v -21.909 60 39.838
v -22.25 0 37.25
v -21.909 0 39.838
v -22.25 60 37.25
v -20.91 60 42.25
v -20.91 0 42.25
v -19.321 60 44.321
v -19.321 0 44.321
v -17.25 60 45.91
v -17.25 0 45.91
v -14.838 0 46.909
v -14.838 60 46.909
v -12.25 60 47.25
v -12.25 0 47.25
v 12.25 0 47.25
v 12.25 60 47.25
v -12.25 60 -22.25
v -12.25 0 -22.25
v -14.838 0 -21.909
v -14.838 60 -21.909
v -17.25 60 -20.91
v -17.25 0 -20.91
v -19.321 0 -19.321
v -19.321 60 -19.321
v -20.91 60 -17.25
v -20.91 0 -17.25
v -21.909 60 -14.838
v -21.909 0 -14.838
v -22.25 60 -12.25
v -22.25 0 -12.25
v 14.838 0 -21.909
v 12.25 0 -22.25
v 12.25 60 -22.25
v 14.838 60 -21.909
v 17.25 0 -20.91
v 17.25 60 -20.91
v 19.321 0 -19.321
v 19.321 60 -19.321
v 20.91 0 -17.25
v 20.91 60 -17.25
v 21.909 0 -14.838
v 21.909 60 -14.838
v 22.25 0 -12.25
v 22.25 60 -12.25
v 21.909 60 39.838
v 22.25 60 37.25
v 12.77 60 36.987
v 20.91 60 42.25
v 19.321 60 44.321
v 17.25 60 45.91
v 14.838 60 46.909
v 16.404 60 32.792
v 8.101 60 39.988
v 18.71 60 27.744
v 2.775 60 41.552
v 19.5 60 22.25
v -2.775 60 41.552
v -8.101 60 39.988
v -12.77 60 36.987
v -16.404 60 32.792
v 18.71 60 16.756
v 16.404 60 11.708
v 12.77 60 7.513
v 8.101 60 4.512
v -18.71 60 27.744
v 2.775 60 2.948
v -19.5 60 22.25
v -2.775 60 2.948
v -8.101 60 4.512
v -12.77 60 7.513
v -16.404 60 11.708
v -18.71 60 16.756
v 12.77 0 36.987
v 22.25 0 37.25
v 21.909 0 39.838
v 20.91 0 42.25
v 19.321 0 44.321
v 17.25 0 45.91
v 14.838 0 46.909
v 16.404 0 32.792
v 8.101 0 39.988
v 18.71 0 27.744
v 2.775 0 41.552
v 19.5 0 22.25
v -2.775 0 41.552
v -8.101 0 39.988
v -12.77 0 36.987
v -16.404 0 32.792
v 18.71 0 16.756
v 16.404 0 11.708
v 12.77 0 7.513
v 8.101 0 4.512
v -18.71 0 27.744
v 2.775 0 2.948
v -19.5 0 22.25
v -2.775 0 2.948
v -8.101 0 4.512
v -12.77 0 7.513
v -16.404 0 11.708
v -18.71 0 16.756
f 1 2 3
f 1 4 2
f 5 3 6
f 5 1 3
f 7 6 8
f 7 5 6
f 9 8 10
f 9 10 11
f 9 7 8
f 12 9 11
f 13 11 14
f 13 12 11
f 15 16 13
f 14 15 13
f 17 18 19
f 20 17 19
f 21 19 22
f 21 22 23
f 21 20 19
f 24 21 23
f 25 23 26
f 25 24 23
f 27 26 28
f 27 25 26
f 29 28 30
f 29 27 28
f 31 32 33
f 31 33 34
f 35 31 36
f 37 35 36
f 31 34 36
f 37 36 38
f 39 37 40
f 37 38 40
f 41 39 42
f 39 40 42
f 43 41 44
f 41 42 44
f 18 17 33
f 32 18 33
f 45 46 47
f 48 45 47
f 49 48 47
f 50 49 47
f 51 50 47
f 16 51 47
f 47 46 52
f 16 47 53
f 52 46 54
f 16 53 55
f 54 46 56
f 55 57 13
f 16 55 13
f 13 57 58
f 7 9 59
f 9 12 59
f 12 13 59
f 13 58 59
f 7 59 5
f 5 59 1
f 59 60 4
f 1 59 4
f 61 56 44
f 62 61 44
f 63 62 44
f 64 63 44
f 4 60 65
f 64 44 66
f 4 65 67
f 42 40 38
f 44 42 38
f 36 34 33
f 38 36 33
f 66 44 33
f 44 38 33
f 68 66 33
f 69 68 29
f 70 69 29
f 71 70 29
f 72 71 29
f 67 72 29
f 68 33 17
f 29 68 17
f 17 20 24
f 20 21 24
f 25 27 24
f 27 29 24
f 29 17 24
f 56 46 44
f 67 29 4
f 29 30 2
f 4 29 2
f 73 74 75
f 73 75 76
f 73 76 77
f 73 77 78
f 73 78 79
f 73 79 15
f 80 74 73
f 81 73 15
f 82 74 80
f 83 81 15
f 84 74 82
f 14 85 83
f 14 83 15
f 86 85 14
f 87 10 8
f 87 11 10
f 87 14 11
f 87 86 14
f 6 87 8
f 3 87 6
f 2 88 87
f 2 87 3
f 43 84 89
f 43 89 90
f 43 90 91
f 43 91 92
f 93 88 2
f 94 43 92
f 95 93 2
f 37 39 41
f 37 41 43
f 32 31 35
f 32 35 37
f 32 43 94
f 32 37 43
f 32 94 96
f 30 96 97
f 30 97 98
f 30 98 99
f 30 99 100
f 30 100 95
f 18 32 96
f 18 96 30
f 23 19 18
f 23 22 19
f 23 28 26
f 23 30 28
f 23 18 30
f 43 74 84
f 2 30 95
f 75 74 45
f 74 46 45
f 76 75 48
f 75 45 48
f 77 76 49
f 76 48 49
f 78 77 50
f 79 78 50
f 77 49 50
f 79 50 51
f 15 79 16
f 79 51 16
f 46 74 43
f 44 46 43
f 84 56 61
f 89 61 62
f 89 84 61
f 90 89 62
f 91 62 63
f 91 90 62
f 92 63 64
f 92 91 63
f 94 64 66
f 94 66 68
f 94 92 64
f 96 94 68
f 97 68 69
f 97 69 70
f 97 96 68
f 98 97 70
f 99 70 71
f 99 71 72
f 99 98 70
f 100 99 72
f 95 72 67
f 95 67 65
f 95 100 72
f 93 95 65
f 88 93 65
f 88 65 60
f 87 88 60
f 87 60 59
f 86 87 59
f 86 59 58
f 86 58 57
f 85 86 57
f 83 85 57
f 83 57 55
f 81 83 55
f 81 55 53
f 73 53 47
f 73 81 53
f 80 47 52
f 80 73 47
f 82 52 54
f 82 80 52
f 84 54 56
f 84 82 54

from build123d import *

# Parameters (mm, degrees)
SKETCH_1_R      = 19.5
EXTRUDE_1_DEPTH = 60
FILLET_1_R      = 10


with BuildPart() as part:
    # 草图1 → 凸台-拉伸1 (new body)
    with BuildSketch(Plane(origin=(0, 0, 0), x_dir=(1, 0, 0), z_dir=(0, 1, 0))):
        Polygon((-22.25, 22.25), (22.25, 22.25), (22.25, -22.25), (22.25, -47.25), (-22.25, -47.25), (-22.25, -22.25), align=None)
        with Locations((0, -22.25)):
            Circle(SKETCH_1_R, mode=Mode.SUBTRACT)
    extrude(amount=EXTRUDE_1_DEPTH)

    # 圆角1
    fillet_1_edges = [part.edges().sort_by_distance(p)[0] for p in [
        (22.25, 30, 47.25),
        (-22.25, 30, 47.25),
        (-22.25, 30, -22.25),
        (22.25, 30, -22.25),
    ]]
    fillet(fillet_1_edges, radius=FILLET_1_R)


solid = part.part
